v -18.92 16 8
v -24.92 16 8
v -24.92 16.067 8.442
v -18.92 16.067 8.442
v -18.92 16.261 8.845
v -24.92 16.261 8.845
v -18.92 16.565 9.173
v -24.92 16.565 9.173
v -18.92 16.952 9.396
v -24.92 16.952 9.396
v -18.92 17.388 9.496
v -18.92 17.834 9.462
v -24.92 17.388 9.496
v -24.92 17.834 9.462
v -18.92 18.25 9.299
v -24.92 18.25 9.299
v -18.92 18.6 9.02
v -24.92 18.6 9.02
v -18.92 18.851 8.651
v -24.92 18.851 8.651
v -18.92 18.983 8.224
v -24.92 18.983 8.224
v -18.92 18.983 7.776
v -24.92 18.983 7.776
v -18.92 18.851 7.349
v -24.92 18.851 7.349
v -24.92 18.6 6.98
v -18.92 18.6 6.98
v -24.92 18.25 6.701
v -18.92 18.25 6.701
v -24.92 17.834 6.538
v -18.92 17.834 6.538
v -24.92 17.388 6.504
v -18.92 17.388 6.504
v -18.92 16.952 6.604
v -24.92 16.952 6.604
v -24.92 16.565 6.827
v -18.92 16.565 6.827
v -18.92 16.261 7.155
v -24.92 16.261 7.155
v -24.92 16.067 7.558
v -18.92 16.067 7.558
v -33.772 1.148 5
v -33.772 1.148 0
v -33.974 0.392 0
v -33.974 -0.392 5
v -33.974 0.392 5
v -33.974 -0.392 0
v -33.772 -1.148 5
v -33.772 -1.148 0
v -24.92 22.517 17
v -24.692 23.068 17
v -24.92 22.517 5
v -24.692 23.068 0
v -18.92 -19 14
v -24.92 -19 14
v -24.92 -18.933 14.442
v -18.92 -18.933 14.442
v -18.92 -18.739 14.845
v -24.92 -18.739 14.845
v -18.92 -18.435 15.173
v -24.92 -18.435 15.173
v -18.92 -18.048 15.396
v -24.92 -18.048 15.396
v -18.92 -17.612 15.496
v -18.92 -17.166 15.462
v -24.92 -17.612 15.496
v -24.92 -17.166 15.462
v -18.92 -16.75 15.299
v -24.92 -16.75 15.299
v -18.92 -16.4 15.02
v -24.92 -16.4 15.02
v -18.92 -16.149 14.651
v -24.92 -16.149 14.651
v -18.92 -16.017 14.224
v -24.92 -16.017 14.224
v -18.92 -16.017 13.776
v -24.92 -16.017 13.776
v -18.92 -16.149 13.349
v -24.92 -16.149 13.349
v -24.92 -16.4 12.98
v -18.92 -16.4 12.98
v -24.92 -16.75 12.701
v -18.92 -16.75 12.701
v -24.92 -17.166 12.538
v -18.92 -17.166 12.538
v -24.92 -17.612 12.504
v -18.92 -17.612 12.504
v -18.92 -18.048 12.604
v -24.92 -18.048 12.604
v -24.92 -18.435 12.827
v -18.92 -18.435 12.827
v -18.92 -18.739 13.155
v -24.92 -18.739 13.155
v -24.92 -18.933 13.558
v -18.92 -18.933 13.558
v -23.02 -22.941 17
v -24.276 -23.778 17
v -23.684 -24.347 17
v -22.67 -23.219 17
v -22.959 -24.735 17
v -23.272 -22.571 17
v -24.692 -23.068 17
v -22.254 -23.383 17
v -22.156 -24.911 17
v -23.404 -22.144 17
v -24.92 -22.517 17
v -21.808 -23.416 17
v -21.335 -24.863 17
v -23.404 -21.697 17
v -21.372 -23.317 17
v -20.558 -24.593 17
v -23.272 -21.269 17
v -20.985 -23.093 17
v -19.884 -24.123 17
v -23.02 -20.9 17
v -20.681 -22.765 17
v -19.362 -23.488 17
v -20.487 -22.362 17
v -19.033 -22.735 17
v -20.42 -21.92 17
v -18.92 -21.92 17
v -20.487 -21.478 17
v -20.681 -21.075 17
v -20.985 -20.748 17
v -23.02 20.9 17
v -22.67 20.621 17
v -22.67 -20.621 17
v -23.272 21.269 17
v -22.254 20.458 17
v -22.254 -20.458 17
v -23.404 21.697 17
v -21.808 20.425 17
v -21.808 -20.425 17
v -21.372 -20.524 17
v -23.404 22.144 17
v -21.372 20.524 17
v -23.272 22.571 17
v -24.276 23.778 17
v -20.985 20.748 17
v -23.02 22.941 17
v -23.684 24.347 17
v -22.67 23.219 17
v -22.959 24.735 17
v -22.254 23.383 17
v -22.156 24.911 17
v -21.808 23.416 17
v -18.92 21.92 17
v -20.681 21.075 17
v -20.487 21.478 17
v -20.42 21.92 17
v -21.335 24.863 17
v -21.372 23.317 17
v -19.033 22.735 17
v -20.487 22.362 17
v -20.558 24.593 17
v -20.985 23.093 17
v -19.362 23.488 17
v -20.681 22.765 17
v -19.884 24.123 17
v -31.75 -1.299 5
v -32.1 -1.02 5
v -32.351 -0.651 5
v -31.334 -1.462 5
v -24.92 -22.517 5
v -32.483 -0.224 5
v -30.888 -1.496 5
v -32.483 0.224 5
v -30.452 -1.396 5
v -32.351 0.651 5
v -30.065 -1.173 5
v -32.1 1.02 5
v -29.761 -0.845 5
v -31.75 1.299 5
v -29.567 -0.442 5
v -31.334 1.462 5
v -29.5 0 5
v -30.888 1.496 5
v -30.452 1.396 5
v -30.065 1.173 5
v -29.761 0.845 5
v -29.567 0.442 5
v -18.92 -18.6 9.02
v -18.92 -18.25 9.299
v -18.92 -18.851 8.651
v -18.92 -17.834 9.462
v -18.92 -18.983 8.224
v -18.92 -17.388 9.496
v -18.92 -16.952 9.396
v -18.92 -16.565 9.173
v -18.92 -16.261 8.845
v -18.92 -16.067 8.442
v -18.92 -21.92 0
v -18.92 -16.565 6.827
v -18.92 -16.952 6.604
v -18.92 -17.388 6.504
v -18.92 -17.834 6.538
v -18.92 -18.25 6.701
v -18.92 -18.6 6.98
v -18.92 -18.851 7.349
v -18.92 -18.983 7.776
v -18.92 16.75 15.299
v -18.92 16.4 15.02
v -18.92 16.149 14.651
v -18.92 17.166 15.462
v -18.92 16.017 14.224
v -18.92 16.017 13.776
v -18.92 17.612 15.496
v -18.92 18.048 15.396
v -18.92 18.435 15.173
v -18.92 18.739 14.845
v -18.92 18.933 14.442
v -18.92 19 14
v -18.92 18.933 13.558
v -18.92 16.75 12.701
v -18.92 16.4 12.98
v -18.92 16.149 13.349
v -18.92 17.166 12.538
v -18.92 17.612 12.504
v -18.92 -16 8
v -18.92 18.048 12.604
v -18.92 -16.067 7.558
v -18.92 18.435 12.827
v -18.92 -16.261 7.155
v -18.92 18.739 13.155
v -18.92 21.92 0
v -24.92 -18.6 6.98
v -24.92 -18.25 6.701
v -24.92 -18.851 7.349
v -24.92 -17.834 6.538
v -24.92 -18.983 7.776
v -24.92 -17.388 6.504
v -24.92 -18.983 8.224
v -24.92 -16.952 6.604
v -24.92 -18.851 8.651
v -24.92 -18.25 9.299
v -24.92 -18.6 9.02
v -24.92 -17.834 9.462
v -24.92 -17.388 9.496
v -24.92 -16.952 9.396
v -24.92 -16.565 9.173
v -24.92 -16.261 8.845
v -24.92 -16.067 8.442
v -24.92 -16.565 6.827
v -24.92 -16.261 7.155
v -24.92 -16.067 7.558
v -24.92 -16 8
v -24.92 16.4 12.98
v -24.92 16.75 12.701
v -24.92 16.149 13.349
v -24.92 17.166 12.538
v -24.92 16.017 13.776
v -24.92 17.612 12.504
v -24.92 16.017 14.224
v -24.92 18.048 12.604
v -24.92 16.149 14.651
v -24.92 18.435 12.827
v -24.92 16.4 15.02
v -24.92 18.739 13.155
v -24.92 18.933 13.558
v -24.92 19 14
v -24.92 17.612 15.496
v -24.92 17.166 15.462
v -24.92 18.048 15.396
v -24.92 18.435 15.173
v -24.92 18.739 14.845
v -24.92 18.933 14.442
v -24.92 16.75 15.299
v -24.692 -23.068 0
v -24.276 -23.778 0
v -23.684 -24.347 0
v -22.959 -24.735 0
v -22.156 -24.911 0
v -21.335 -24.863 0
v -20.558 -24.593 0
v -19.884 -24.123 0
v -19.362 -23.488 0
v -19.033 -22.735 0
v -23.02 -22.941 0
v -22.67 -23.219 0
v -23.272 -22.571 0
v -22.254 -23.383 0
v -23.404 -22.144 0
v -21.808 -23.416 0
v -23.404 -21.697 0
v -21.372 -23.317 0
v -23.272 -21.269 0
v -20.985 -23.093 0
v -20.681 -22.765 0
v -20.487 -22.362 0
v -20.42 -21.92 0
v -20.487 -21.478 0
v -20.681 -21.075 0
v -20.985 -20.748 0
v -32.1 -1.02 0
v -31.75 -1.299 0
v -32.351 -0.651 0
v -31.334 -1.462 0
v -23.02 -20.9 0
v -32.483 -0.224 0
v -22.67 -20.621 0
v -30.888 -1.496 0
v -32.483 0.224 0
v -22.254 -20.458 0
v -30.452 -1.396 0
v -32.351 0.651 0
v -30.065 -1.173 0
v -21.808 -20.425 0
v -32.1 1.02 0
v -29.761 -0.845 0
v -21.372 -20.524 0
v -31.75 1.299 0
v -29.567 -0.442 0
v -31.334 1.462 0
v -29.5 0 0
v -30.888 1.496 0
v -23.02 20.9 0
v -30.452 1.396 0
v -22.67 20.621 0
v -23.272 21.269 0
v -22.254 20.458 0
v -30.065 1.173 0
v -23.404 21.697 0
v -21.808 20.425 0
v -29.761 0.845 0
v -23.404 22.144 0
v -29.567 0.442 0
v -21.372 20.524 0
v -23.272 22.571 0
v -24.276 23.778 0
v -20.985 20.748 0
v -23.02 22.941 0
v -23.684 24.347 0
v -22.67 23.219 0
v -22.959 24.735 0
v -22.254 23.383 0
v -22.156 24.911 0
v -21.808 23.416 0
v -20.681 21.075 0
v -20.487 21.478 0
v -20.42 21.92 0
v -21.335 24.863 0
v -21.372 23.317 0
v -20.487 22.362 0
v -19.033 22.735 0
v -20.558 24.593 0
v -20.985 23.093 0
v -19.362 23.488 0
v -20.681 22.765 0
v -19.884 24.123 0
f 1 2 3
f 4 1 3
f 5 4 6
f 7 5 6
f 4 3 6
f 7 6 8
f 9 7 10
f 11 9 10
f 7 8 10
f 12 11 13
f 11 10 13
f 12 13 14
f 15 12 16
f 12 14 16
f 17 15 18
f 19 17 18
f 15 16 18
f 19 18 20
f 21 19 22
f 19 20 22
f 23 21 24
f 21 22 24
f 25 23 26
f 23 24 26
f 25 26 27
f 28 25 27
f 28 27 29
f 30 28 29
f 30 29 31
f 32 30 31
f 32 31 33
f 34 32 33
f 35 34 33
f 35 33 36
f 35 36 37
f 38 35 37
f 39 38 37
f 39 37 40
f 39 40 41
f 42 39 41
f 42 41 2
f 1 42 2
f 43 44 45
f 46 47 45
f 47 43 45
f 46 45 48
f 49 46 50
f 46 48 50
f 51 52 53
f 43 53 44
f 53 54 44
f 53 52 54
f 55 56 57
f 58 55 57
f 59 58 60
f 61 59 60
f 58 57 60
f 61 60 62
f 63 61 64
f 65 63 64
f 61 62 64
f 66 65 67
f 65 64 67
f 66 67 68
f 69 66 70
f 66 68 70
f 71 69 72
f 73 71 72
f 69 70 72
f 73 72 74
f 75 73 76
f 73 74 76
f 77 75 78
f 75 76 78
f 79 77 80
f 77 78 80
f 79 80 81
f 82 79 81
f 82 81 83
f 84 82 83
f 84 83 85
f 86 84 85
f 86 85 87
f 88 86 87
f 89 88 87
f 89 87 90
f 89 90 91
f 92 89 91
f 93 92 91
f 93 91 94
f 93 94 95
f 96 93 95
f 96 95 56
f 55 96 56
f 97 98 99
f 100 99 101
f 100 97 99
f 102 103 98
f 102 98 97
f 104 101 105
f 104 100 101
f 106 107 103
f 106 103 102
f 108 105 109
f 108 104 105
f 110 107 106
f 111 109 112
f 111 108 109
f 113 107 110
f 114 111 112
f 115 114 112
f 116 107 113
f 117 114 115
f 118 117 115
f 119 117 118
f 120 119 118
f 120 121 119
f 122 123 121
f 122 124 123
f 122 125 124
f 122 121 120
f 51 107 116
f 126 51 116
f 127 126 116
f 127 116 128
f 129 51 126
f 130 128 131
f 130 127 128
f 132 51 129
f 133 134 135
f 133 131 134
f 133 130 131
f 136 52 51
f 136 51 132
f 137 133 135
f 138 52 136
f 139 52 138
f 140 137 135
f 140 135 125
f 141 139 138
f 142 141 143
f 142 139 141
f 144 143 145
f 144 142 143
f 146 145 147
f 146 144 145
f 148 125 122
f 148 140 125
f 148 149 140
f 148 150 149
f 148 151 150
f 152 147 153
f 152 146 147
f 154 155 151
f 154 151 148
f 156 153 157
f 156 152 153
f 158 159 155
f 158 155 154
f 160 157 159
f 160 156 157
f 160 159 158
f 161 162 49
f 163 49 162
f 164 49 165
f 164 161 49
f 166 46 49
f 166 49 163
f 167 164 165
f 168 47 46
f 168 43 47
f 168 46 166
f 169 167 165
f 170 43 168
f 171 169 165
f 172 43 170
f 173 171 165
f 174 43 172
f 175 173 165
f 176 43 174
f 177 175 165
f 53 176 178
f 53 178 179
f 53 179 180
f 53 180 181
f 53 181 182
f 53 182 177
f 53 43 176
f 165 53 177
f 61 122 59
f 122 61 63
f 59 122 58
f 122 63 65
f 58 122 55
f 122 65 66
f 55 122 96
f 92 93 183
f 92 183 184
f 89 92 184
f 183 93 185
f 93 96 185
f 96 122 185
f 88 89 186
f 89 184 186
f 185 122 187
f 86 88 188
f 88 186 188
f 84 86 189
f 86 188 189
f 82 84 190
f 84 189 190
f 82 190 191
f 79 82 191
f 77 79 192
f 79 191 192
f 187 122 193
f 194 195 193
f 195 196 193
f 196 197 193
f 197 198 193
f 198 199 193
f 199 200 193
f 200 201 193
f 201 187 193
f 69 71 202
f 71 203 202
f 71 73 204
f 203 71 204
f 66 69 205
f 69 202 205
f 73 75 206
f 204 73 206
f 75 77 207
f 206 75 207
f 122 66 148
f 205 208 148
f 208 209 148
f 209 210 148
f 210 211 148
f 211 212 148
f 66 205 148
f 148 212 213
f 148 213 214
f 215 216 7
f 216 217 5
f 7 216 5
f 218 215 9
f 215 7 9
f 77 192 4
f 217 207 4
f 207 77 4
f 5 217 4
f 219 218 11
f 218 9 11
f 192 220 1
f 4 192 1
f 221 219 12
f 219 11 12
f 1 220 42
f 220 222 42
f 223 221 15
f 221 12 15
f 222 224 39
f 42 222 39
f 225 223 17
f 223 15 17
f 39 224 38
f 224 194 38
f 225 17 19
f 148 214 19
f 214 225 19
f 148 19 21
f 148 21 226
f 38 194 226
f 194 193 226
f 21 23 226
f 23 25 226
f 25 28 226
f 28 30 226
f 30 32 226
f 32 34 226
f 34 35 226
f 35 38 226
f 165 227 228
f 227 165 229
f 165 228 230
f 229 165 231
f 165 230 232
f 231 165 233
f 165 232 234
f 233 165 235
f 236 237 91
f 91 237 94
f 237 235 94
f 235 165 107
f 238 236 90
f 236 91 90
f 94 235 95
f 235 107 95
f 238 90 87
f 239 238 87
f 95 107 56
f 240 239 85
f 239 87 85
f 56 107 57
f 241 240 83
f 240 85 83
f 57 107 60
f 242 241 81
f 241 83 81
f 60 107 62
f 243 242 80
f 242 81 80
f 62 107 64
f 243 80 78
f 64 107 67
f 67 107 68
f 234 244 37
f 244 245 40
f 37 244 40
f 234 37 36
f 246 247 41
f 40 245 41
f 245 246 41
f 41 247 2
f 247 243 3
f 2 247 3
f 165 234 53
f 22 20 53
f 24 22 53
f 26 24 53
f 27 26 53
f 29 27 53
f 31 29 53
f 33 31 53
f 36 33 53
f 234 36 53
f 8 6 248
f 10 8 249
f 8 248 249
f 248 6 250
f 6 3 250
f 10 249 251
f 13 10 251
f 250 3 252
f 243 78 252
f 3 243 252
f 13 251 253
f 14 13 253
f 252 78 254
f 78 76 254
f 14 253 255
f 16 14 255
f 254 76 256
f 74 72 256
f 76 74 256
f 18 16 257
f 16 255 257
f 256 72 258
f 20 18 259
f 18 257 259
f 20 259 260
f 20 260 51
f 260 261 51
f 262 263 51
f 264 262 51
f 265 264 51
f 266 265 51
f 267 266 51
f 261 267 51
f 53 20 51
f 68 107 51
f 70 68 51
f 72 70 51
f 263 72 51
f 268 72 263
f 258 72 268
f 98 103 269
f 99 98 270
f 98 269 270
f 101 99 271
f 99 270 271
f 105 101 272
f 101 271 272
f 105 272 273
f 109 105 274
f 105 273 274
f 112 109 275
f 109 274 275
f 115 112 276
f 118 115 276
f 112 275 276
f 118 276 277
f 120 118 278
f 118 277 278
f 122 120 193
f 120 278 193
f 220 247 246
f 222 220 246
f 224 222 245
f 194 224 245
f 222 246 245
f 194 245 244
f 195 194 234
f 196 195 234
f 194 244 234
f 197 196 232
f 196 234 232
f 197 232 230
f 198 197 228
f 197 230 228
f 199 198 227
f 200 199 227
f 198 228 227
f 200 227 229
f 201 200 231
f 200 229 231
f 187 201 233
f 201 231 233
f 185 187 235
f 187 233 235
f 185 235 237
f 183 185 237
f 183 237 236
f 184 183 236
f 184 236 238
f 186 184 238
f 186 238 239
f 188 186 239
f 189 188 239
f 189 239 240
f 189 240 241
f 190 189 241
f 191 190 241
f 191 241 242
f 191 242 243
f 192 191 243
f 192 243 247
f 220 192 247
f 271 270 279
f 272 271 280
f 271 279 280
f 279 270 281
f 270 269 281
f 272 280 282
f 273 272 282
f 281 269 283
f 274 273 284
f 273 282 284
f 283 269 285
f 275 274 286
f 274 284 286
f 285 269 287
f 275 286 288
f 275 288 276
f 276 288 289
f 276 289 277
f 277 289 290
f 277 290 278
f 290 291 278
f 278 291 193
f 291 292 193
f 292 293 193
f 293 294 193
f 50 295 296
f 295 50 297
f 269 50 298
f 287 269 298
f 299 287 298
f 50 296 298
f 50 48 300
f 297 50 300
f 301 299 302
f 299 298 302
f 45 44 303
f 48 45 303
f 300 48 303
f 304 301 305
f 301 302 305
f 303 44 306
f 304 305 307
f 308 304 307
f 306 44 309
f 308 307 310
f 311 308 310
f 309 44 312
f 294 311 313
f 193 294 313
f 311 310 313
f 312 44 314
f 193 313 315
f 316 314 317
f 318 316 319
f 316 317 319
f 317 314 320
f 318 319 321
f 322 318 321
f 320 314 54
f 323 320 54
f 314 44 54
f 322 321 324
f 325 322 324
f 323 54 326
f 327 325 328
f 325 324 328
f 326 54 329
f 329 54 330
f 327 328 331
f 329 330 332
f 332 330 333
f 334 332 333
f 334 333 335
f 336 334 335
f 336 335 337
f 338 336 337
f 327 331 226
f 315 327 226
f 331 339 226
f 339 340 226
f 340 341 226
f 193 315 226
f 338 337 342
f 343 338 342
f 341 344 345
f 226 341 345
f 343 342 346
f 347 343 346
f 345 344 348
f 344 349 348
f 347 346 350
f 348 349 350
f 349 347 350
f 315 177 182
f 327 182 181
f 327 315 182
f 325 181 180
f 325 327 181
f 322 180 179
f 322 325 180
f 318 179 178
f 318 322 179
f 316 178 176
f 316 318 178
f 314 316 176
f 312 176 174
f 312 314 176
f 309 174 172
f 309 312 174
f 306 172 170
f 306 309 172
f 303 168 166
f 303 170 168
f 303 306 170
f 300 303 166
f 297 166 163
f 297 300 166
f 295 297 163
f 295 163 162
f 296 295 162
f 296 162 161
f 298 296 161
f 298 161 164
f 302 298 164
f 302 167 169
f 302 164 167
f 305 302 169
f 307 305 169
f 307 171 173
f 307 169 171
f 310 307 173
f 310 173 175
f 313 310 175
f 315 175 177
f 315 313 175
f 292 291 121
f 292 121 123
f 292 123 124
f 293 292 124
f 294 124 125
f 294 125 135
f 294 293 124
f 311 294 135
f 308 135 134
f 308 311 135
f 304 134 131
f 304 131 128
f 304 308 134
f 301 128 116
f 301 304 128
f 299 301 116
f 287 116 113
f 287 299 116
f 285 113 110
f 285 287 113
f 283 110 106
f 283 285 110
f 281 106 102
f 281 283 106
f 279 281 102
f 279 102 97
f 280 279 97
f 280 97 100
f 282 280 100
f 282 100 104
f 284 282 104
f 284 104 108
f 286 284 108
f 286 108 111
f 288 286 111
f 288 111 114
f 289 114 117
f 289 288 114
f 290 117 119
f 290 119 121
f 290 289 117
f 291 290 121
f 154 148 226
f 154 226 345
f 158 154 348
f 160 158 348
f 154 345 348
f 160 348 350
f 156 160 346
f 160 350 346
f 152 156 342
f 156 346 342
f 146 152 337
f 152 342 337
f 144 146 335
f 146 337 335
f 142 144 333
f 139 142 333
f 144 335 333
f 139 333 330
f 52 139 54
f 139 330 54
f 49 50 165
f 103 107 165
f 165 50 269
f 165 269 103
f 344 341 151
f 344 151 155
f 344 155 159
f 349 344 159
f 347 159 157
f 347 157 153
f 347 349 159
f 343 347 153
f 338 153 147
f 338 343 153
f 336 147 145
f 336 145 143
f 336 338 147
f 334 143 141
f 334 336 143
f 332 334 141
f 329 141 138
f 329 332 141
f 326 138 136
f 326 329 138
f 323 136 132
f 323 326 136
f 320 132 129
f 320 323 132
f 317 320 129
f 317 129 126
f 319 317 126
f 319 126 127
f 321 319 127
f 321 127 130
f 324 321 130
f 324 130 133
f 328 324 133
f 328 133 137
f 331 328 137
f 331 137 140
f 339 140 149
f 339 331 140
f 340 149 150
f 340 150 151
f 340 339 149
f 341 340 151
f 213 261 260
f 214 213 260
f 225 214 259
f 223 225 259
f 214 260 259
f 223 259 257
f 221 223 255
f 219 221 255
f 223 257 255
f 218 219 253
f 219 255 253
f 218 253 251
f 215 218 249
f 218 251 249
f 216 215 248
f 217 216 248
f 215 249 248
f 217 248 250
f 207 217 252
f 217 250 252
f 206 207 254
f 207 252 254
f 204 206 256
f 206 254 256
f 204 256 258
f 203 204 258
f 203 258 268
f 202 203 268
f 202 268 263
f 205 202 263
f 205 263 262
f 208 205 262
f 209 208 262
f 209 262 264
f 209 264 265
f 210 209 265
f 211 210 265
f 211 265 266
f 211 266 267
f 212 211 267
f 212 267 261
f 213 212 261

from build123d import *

# Parameters (mm, degrees)
SKETCH_1_R          = 1.5
EXTRUDE_1_DEPTH     = 17
SKETCH_3_W          = 9.079689783
SKETCH_3_H          = 45.034094638
CUT_EXTRUDE_2_DEPTH = 12
SKETCH_5_R          = 1.5
CUT_EXTRUDE_3_DEPTH = 32.503374865


with BuildPart() as part:
    # 草图1 → 凸台-拉伸1 (new body)
    with BuildSketch(Plane.XY):
        with BuildLine():
            Line((-24.691948814, 23.068360514), (-33.771638598, 1.148050297))
            ThreePointArc((-33.771638598, 1.148050297), (-34, 0), (-33.771638598, -1.148050297))
            Line((-33.771638598, -1.148050297), (-24.691948814, -23.068360514))
            ThreePointArc((-24.691948814, -23.068360514), (-21.335039251, -24.862666058), (-18.920310217, -21.920310217))
            Line((-18.920310217, -21.920310217), (-18.920310217, 21.920310217))
            ThreePointArc((-18.920310217, 21.920310217), (-21.335039251, 24.862666058), (-24.691948814, 23.068360514))
        make_face()
        with Locations((-31, 0)):
            Circle(SKETCH_1_R, mode=Mode.SUBTRACT)
        with Locations((-21.920310217, 21.920310217)):
            Circle(SKETCH_1_R, mode=Mode.SUBTRACT)
        with Locations((-21.920310217, -21.920310217)):
            Circle(SKETCH_1_R, mode=Mode.SUBTRACT)
    extrude(amount=EXTRUDE_1_DEPTH)

    # 草图3 → 切除-拉伸2 (cut)
    with BuildSketch(Plane.XY.offset(17)):
        with Locations((-29.460155109, 0)):
            Rectangle(SKETCH_3_W, SKETCH_3_H)
    extrude(amount=-CUT_EXTRUDE_2_DEPTH, mode=Mode.SUBTRACT)

    # 草图5 → 切除-拉伸3 (cut, through all)
    with BuildSketch(Plane.ZY.offset(24.920310217)):
        with Locations(Location((8, 17.5, 0), (0, 0, 270))):
            Circle(SKETCH_5_R)
        with Locations(Location((14, 17.5, 0), (0, 0, 90))):
            Circle(SKETCH_5_R)
        with Locations(Location((14, -17.5, 0), (0, 0, 270))):
            Circle(SKETCH_5_R)
        with Locations(Location((8, -17.5, 0), (0, 0, 90))):
            Circle(SKETCH_5_R)
    extrude(amount=-CUT_EXTRUDE_3_DEPTH, mode=Mode.SUBTRACT)


solid = part.part
